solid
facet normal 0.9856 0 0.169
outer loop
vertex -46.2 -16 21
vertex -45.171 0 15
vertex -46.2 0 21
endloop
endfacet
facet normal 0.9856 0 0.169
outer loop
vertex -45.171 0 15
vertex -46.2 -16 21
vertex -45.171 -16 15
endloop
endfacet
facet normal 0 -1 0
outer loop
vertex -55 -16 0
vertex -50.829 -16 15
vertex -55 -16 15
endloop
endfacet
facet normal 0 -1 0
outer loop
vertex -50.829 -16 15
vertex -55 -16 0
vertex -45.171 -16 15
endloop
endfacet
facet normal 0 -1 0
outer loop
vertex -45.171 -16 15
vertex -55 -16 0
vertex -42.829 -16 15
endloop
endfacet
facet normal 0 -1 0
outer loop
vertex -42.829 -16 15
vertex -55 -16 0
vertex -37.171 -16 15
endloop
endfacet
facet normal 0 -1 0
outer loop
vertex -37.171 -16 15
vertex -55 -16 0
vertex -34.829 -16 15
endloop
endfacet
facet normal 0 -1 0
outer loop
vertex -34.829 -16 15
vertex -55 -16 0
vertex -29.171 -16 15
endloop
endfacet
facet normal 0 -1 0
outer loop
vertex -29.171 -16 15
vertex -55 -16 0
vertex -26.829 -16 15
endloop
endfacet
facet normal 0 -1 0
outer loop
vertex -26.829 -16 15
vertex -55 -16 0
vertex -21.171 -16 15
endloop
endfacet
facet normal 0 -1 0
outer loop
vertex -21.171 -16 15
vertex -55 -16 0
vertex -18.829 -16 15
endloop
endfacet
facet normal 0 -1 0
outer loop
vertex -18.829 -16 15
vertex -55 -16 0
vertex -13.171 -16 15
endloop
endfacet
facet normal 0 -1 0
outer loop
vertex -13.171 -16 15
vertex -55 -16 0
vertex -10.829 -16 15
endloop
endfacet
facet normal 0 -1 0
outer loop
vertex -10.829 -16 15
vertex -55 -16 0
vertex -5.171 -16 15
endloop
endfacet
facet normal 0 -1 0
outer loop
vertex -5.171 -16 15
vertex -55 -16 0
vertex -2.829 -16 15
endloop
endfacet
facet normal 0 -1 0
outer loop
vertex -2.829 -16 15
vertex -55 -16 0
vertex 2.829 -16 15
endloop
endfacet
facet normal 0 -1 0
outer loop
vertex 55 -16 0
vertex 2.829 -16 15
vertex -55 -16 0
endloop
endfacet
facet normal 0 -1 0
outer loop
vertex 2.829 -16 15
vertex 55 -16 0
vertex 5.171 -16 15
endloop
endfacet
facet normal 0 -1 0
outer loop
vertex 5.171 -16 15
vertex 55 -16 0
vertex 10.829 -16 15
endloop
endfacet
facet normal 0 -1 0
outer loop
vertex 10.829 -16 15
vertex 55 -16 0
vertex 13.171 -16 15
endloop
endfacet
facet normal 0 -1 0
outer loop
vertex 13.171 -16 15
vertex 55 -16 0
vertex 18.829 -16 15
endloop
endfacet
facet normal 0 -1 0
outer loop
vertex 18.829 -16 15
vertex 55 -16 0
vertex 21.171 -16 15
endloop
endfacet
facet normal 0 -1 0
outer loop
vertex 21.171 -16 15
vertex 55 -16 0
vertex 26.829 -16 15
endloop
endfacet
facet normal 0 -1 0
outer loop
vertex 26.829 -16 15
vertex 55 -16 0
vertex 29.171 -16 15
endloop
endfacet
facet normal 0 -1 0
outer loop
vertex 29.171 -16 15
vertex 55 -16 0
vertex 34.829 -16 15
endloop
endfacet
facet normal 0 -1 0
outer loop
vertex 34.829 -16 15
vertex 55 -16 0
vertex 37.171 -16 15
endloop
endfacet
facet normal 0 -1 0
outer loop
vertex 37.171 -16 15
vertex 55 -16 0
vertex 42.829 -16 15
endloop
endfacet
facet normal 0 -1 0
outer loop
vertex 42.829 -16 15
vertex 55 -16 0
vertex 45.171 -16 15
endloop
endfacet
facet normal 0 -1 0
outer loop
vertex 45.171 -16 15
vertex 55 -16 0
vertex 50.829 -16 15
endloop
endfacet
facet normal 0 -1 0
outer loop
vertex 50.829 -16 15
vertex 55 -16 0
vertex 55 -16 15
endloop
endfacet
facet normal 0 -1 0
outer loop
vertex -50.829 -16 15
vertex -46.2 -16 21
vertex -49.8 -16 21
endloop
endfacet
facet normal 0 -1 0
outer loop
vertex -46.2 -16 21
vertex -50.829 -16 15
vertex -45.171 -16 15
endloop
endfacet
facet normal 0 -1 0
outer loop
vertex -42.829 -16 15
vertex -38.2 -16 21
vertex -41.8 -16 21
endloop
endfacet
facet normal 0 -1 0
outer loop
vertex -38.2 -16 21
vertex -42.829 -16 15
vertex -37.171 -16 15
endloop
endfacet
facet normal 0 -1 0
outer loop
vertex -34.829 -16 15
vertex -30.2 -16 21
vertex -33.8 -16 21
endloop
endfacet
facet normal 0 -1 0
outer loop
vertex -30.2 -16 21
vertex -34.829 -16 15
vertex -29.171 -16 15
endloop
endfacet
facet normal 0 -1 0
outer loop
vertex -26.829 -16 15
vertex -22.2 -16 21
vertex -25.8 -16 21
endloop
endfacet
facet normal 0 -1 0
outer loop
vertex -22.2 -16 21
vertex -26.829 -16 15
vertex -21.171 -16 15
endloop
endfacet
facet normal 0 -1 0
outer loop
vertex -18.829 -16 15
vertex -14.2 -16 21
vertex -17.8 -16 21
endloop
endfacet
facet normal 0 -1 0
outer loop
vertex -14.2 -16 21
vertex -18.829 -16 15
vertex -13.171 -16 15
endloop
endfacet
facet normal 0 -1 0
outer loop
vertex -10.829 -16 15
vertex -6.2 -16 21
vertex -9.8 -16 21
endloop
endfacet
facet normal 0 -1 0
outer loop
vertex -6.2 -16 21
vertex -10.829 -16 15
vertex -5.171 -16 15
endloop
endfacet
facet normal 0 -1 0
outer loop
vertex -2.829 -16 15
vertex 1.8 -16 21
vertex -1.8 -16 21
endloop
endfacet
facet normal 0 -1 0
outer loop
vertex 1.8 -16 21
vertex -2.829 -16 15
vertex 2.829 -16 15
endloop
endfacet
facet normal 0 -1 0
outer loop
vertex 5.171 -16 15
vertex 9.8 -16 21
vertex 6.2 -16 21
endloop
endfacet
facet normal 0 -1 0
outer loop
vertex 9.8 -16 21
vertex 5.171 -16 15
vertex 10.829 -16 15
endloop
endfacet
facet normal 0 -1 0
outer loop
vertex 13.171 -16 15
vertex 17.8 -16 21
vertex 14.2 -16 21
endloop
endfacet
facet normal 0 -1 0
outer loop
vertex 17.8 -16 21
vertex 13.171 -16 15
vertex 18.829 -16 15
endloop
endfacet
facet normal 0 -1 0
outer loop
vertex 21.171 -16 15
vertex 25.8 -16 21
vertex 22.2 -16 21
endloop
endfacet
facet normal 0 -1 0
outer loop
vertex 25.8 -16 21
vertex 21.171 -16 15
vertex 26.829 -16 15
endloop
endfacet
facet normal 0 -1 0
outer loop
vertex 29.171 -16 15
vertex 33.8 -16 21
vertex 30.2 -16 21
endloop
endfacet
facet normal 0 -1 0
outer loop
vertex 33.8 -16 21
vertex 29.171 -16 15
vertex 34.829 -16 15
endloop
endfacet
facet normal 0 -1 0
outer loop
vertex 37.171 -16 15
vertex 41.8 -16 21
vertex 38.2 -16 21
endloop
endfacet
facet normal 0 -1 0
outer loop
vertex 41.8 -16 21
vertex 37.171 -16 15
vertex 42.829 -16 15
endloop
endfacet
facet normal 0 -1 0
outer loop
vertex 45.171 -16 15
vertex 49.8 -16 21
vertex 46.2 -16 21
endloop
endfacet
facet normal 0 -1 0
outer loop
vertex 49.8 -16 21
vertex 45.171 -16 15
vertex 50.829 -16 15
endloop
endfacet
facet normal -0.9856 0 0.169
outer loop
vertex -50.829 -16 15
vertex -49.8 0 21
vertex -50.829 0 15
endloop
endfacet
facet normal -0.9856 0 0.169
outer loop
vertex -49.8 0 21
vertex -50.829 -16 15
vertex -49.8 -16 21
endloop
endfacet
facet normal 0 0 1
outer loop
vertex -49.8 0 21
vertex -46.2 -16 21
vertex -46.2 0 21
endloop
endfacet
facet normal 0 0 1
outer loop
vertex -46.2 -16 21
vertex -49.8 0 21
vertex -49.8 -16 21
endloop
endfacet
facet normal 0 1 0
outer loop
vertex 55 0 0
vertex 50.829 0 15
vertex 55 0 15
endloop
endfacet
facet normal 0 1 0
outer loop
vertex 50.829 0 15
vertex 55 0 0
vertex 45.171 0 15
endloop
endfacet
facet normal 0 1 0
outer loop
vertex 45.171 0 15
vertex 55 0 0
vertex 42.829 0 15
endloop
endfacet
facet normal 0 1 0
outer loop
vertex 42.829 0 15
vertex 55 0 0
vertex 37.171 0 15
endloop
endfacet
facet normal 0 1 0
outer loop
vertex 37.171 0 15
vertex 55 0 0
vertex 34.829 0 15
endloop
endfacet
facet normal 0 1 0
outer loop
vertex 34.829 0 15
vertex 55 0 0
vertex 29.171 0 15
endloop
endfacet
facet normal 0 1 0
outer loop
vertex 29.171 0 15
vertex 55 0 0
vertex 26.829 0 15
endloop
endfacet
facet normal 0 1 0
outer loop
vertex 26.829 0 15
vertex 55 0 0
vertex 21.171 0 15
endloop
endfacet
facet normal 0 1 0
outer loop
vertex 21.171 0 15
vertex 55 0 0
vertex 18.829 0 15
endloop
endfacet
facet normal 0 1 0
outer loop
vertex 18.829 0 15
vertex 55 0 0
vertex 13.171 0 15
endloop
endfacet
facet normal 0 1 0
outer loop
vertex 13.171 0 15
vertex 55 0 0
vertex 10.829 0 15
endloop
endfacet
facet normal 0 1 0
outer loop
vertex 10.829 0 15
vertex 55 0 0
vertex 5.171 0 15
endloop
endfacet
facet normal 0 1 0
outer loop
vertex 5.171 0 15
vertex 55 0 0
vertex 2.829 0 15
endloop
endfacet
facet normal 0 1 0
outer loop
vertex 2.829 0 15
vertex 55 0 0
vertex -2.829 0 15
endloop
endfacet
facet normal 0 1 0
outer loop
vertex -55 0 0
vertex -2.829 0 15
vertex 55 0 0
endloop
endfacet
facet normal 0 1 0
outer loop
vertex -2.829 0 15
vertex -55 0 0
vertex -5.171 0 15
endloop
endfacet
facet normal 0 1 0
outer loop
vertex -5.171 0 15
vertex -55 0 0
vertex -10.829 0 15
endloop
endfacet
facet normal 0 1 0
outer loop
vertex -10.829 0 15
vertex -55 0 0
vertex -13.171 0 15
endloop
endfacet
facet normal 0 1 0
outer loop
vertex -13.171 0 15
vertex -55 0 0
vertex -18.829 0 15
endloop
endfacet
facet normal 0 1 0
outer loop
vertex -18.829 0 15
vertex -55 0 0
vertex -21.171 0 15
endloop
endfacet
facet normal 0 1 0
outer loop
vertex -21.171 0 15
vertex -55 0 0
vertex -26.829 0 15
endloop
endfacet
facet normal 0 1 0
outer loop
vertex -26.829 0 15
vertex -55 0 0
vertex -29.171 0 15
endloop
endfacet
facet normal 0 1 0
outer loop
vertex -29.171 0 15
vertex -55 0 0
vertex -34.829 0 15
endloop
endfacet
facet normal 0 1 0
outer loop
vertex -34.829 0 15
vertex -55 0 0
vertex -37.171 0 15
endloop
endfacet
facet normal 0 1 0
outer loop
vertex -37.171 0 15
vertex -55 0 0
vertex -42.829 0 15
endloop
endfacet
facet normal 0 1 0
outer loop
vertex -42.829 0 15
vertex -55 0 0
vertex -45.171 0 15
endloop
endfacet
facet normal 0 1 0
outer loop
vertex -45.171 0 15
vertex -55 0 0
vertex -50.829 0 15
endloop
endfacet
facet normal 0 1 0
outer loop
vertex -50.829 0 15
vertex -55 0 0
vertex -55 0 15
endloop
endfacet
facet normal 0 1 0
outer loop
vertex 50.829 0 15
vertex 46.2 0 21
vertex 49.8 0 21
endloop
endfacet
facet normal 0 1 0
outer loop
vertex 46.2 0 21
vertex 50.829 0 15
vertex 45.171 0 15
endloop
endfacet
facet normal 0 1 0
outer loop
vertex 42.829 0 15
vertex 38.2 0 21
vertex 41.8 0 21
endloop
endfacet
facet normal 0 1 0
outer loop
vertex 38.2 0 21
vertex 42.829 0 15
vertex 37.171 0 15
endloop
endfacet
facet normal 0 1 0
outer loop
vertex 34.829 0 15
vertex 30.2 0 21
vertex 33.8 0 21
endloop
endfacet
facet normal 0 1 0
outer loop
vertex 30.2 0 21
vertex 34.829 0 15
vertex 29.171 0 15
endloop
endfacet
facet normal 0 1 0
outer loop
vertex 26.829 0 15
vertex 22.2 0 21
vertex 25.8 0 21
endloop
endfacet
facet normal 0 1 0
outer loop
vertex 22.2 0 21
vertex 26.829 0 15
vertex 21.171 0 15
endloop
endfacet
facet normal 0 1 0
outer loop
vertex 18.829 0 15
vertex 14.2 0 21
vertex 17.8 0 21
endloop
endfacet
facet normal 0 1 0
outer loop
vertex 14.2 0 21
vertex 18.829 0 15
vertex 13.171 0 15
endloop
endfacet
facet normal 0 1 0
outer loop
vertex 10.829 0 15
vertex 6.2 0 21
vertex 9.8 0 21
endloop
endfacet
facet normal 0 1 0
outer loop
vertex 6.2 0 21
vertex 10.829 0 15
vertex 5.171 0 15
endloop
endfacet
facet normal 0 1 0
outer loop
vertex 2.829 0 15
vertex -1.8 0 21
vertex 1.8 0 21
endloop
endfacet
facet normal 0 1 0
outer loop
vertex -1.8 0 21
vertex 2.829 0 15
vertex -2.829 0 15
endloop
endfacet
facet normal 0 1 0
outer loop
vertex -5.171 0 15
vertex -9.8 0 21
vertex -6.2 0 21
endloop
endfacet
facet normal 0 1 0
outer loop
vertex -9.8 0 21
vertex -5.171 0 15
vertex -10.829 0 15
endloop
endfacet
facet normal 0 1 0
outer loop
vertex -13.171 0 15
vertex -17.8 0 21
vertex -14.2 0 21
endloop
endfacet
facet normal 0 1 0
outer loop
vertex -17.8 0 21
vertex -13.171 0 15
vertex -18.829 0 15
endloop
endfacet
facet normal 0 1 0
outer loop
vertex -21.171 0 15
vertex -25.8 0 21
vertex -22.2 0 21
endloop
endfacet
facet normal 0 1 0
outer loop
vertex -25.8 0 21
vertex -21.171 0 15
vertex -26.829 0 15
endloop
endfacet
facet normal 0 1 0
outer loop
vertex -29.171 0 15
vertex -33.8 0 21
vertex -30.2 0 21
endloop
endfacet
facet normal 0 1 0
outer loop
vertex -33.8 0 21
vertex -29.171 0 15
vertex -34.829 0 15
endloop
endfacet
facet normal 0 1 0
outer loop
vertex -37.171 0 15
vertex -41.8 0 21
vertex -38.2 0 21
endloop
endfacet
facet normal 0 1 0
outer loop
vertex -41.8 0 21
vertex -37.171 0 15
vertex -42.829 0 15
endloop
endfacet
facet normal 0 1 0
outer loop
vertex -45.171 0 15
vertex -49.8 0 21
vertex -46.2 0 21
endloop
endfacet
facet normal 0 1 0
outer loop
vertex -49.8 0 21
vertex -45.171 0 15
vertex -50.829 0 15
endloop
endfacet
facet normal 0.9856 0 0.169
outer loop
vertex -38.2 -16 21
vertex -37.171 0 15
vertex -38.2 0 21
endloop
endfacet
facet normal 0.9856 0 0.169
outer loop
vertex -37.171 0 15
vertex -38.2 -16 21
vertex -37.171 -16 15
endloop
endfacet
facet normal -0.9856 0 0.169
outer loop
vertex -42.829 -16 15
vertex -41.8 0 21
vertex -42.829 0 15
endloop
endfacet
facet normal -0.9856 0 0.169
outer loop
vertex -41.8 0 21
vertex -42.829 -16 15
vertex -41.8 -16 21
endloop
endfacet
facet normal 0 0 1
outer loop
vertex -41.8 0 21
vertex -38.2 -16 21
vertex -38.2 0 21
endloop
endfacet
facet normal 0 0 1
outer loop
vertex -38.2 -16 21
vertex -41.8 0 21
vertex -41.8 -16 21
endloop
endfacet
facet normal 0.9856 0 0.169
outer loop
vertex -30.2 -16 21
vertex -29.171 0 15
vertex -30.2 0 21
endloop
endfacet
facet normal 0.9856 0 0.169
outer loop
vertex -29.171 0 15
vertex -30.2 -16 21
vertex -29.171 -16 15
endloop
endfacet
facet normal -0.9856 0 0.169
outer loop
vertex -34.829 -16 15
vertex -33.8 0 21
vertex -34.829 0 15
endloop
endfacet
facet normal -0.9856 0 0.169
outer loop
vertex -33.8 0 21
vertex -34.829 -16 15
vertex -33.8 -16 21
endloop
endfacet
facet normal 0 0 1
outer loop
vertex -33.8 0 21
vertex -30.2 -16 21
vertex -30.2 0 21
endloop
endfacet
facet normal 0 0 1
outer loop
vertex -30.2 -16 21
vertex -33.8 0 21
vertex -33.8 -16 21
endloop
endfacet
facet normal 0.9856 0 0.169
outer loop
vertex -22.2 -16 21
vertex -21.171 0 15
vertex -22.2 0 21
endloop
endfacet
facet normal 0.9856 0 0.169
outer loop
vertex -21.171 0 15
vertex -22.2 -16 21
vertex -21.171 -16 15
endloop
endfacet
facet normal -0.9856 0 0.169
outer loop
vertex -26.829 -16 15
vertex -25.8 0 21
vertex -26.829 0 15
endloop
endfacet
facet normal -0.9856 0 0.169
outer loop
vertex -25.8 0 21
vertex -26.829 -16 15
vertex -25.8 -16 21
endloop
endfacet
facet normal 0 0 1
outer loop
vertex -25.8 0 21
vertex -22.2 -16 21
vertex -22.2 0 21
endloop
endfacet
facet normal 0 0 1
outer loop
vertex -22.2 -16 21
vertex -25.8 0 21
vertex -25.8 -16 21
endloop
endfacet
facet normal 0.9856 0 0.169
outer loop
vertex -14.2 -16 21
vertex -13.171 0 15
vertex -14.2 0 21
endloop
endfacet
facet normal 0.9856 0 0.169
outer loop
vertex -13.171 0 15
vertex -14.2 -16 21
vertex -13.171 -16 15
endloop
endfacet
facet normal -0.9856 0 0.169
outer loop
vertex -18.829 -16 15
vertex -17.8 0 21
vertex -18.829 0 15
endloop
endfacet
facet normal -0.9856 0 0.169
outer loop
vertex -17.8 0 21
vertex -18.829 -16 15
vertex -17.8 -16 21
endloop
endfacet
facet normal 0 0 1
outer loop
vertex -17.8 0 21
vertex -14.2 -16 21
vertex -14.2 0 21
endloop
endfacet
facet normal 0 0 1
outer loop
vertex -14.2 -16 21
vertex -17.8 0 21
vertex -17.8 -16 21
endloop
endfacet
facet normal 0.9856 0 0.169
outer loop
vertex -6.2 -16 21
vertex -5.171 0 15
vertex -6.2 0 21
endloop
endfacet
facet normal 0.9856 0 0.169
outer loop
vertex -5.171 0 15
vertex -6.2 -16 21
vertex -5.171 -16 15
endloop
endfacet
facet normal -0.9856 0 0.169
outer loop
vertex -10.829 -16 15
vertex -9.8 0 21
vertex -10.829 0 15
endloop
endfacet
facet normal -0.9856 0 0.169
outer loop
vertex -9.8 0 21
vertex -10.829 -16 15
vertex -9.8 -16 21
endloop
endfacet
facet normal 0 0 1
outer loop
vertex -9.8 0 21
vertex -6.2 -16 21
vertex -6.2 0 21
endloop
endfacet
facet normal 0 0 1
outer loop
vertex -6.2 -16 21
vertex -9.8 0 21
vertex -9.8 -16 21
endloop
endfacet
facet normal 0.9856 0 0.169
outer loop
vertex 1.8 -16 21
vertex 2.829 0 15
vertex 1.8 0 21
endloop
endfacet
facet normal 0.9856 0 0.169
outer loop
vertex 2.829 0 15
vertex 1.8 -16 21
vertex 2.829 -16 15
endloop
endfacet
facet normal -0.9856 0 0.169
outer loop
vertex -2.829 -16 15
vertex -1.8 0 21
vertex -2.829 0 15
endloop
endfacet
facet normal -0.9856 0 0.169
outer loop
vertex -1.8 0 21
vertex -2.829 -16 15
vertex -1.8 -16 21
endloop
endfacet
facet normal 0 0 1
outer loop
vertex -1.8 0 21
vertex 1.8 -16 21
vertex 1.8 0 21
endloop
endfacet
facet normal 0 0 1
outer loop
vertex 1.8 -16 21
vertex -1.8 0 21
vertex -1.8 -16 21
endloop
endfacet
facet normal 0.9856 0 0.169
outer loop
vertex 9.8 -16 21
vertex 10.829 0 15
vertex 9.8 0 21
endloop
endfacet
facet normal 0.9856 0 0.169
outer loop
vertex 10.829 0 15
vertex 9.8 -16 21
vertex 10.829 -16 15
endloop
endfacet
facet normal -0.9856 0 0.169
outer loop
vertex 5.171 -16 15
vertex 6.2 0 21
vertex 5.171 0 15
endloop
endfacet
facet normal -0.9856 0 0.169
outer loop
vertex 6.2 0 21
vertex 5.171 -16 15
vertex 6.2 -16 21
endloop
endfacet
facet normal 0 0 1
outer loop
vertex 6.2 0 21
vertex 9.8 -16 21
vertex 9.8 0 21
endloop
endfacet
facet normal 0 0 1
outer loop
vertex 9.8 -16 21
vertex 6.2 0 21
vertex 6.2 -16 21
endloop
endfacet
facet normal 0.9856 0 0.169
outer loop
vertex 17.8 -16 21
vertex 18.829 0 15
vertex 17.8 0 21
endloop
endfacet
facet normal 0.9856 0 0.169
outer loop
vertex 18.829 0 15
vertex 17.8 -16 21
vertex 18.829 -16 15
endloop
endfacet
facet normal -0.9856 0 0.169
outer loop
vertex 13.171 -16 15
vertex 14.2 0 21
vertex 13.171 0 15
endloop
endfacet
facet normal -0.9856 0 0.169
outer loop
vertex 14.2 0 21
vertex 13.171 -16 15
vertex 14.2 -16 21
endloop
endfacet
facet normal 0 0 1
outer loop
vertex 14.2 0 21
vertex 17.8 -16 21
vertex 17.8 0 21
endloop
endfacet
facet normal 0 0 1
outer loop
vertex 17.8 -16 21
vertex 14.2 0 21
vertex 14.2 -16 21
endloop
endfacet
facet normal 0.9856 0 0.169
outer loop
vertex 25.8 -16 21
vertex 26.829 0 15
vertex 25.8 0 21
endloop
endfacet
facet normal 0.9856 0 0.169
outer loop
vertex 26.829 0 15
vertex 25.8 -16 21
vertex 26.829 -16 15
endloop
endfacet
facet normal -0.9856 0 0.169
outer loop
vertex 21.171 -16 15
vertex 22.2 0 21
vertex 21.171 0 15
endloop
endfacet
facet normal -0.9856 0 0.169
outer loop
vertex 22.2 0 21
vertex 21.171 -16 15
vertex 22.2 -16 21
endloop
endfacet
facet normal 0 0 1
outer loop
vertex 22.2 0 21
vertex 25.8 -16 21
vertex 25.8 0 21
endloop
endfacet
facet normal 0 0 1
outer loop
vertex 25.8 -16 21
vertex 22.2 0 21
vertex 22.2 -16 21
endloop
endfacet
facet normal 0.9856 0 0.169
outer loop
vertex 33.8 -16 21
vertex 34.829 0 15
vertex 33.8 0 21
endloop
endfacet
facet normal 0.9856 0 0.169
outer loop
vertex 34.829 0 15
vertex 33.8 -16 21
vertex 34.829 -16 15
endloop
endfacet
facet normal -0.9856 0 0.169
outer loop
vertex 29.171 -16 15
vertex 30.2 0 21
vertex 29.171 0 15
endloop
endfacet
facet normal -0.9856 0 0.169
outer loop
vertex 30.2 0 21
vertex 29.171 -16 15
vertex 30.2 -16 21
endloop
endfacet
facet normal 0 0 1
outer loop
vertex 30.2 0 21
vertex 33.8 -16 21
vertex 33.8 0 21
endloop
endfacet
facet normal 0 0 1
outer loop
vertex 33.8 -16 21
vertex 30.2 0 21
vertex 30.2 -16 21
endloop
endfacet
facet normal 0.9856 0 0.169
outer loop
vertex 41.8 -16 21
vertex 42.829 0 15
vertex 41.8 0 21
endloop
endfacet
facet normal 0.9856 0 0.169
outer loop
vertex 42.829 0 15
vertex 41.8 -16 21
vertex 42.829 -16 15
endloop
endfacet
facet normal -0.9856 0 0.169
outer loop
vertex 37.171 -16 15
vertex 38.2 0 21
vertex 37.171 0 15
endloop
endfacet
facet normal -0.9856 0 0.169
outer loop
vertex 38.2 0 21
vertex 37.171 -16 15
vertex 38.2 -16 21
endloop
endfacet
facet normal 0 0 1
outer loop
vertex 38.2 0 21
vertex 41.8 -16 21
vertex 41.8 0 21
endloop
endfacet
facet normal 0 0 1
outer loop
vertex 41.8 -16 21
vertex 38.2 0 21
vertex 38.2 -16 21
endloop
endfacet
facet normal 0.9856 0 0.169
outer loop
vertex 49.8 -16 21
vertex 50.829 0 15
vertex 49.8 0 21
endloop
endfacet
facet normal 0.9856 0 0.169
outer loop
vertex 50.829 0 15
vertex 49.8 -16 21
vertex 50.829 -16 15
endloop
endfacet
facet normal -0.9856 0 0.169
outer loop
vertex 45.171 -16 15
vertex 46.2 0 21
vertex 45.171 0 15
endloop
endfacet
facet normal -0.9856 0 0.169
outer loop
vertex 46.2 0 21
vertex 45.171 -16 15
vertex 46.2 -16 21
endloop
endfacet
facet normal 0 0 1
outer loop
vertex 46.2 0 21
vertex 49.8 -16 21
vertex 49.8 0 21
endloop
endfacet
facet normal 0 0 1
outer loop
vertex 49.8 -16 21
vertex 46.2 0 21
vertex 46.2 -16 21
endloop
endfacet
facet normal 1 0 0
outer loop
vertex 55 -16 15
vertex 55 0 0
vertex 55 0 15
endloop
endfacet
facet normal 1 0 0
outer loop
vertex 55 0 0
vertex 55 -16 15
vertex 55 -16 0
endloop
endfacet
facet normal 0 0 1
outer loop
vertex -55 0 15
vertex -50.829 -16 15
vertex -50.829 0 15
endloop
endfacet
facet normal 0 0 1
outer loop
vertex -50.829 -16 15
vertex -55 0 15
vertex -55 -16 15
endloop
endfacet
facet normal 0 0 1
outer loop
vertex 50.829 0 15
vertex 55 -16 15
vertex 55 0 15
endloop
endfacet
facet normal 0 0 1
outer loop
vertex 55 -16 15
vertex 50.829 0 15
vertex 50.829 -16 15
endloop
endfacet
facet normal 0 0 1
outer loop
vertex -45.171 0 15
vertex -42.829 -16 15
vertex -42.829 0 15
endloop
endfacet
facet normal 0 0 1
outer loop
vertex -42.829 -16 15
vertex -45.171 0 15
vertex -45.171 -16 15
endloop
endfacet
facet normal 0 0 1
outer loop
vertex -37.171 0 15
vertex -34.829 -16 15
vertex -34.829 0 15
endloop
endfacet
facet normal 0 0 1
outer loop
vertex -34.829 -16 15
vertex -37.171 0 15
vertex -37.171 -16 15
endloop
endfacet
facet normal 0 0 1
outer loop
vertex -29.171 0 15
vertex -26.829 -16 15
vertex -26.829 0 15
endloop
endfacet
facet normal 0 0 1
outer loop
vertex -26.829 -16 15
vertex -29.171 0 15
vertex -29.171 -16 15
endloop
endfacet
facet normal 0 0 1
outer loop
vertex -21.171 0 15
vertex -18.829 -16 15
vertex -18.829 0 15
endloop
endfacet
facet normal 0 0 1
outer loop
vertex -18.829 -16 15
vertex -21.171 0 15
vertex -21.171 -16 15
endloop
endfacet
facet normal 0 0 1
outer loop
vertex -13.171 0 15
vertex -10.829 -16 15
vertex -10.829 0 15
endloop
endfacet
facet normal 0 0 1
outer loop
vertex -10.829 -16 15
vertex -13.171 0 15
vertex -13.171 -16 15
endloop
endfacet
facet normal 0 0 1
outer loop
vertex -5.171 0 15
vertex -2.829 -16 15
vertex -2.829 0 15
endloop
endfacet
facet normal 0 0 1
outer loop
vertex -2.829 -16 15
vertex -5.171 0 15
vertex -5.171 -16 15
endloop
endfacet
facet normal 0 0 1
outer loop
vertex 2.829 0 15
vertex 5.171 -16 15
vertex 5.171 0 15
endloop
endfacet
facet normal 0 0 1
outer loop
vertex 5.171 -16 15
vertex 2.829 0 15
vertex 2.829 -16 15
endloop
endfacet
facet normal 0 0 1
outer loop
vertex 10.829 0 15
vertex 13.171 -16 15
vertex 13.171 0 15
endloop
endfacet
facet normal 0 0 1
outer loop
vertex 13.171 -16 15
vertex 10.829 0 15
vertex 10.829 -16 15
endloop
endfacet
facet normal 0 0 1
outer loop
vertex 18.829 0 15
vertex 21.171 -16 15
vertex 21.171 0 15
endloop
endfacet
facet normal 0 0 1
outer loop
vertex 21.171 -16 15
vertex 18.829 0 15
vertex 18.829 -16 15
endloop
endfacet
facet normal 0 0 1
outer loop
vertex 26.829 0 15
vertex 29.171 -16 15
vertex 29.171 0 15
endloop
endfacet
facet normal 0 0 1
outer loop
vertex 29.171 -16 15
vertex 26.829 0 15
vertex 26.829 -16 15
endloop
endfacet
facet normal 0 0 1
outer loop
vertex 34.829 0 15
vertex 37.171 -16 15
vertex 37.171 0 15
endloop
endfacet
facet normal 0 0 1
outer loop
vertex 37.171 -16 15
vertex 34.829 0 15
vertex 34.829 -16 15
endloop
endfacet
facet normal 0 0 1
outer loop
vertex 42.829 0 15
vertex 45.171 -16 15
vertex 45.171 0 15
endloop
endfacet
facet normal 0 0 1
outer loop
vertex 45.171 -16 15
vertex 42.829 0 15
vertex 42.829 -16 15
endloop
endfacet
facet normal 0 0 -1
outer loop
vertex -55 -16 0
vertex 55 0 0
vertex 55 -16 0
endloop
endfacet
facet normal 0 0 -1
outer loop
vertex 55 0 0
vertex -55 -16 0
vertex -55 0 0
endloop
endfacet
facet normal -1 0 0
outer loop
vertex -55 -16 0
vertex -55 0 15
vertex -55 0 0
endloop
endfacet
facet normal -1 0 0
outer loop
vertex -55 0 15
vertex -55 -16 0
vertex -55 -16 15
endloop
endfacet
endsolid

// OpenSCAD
$fn = 32;

// ----------------------------------------------------------------------
// Toothed rack, 13 teeth
// 8 mm pitch, 6 mm teeth
// ----------------------------------------------------------------------

// --- parameters (mm) ---
bar_w = 16;     // bar width (Y)
bar_h = 15;     // bar height (Z)
teeth = 13;     // number of teeth
pitch = 8;      // tooth pitch
tooth_h = 6;    // tooth height above the bar
root_w = 6;     // tooth width at the root
crest_w = 3.6;  // tooth width at the crest

// --- derived feature positions (mm) ---
span = (teeth - 1) * pitch;  // = 96   distance between the outer teeth
bar_l = span + root_w + 8;   // = 110   bar length: teeth plus 4 mm at each end
tooth_x = -span / 2;         // = -48   X of the first tooth
height = bar_h + tooth_h;    // = 21   overall height
feature_centers = [
  [tooth_x + 0 * pitch, -bar_w / 2],
  [tooth_x + 1 * pitch, -bar_w / 2],
  [tooth_x + 2 * pitch, -bar_w / 2],
  [tooth_x + 3 * pitch, -bar_w / 2],
  [tooth_x + 4 * pitch, -bar_w / 2],
  [tooth_x + 5 * pitch, -bar_w / 2],
  [tooth_x + 6 * pitch, -bar_w / 2],
  [tooth_x + 7 * pitch, -bar_w / 2],
  [tooth_x + 8 * pitch, -bar_w / 2],
  [tooth_x + 9 * pitch, -bar_w / 2],
  [tooth_x + 10 * pitch, -bar_w / 2],
  [tooth_x + 11 * pitch, -bar_w / 2],
  [tooth_x + 12 * pitch, -bar_w / 2]
];   // tooth centre line, drives the tooth loop

// bar with a rack of teeth, one extruded trapezoium per centre
module rack_tooth() {
  linear_extrude(height = bar_w)
    polygon(points = [
      [0, 0],
      [root_w, 0],
      [root_w / 2 + crest_w / 2, tooth_h + 1],
      [root_w / 2 - crest_w / 2, tooth_h + 1]
    ]);
}

union() {
  translate([-bar_l / 2, -bar_w, 0]) cube([bar_l, bar_w, bar_h]);
  for (centre = feature_centers)
    translate([centre[0] - root_w / 2, 0, bar_h - 1]) rotate([90, 0, 0]) rack_tooth();
}
